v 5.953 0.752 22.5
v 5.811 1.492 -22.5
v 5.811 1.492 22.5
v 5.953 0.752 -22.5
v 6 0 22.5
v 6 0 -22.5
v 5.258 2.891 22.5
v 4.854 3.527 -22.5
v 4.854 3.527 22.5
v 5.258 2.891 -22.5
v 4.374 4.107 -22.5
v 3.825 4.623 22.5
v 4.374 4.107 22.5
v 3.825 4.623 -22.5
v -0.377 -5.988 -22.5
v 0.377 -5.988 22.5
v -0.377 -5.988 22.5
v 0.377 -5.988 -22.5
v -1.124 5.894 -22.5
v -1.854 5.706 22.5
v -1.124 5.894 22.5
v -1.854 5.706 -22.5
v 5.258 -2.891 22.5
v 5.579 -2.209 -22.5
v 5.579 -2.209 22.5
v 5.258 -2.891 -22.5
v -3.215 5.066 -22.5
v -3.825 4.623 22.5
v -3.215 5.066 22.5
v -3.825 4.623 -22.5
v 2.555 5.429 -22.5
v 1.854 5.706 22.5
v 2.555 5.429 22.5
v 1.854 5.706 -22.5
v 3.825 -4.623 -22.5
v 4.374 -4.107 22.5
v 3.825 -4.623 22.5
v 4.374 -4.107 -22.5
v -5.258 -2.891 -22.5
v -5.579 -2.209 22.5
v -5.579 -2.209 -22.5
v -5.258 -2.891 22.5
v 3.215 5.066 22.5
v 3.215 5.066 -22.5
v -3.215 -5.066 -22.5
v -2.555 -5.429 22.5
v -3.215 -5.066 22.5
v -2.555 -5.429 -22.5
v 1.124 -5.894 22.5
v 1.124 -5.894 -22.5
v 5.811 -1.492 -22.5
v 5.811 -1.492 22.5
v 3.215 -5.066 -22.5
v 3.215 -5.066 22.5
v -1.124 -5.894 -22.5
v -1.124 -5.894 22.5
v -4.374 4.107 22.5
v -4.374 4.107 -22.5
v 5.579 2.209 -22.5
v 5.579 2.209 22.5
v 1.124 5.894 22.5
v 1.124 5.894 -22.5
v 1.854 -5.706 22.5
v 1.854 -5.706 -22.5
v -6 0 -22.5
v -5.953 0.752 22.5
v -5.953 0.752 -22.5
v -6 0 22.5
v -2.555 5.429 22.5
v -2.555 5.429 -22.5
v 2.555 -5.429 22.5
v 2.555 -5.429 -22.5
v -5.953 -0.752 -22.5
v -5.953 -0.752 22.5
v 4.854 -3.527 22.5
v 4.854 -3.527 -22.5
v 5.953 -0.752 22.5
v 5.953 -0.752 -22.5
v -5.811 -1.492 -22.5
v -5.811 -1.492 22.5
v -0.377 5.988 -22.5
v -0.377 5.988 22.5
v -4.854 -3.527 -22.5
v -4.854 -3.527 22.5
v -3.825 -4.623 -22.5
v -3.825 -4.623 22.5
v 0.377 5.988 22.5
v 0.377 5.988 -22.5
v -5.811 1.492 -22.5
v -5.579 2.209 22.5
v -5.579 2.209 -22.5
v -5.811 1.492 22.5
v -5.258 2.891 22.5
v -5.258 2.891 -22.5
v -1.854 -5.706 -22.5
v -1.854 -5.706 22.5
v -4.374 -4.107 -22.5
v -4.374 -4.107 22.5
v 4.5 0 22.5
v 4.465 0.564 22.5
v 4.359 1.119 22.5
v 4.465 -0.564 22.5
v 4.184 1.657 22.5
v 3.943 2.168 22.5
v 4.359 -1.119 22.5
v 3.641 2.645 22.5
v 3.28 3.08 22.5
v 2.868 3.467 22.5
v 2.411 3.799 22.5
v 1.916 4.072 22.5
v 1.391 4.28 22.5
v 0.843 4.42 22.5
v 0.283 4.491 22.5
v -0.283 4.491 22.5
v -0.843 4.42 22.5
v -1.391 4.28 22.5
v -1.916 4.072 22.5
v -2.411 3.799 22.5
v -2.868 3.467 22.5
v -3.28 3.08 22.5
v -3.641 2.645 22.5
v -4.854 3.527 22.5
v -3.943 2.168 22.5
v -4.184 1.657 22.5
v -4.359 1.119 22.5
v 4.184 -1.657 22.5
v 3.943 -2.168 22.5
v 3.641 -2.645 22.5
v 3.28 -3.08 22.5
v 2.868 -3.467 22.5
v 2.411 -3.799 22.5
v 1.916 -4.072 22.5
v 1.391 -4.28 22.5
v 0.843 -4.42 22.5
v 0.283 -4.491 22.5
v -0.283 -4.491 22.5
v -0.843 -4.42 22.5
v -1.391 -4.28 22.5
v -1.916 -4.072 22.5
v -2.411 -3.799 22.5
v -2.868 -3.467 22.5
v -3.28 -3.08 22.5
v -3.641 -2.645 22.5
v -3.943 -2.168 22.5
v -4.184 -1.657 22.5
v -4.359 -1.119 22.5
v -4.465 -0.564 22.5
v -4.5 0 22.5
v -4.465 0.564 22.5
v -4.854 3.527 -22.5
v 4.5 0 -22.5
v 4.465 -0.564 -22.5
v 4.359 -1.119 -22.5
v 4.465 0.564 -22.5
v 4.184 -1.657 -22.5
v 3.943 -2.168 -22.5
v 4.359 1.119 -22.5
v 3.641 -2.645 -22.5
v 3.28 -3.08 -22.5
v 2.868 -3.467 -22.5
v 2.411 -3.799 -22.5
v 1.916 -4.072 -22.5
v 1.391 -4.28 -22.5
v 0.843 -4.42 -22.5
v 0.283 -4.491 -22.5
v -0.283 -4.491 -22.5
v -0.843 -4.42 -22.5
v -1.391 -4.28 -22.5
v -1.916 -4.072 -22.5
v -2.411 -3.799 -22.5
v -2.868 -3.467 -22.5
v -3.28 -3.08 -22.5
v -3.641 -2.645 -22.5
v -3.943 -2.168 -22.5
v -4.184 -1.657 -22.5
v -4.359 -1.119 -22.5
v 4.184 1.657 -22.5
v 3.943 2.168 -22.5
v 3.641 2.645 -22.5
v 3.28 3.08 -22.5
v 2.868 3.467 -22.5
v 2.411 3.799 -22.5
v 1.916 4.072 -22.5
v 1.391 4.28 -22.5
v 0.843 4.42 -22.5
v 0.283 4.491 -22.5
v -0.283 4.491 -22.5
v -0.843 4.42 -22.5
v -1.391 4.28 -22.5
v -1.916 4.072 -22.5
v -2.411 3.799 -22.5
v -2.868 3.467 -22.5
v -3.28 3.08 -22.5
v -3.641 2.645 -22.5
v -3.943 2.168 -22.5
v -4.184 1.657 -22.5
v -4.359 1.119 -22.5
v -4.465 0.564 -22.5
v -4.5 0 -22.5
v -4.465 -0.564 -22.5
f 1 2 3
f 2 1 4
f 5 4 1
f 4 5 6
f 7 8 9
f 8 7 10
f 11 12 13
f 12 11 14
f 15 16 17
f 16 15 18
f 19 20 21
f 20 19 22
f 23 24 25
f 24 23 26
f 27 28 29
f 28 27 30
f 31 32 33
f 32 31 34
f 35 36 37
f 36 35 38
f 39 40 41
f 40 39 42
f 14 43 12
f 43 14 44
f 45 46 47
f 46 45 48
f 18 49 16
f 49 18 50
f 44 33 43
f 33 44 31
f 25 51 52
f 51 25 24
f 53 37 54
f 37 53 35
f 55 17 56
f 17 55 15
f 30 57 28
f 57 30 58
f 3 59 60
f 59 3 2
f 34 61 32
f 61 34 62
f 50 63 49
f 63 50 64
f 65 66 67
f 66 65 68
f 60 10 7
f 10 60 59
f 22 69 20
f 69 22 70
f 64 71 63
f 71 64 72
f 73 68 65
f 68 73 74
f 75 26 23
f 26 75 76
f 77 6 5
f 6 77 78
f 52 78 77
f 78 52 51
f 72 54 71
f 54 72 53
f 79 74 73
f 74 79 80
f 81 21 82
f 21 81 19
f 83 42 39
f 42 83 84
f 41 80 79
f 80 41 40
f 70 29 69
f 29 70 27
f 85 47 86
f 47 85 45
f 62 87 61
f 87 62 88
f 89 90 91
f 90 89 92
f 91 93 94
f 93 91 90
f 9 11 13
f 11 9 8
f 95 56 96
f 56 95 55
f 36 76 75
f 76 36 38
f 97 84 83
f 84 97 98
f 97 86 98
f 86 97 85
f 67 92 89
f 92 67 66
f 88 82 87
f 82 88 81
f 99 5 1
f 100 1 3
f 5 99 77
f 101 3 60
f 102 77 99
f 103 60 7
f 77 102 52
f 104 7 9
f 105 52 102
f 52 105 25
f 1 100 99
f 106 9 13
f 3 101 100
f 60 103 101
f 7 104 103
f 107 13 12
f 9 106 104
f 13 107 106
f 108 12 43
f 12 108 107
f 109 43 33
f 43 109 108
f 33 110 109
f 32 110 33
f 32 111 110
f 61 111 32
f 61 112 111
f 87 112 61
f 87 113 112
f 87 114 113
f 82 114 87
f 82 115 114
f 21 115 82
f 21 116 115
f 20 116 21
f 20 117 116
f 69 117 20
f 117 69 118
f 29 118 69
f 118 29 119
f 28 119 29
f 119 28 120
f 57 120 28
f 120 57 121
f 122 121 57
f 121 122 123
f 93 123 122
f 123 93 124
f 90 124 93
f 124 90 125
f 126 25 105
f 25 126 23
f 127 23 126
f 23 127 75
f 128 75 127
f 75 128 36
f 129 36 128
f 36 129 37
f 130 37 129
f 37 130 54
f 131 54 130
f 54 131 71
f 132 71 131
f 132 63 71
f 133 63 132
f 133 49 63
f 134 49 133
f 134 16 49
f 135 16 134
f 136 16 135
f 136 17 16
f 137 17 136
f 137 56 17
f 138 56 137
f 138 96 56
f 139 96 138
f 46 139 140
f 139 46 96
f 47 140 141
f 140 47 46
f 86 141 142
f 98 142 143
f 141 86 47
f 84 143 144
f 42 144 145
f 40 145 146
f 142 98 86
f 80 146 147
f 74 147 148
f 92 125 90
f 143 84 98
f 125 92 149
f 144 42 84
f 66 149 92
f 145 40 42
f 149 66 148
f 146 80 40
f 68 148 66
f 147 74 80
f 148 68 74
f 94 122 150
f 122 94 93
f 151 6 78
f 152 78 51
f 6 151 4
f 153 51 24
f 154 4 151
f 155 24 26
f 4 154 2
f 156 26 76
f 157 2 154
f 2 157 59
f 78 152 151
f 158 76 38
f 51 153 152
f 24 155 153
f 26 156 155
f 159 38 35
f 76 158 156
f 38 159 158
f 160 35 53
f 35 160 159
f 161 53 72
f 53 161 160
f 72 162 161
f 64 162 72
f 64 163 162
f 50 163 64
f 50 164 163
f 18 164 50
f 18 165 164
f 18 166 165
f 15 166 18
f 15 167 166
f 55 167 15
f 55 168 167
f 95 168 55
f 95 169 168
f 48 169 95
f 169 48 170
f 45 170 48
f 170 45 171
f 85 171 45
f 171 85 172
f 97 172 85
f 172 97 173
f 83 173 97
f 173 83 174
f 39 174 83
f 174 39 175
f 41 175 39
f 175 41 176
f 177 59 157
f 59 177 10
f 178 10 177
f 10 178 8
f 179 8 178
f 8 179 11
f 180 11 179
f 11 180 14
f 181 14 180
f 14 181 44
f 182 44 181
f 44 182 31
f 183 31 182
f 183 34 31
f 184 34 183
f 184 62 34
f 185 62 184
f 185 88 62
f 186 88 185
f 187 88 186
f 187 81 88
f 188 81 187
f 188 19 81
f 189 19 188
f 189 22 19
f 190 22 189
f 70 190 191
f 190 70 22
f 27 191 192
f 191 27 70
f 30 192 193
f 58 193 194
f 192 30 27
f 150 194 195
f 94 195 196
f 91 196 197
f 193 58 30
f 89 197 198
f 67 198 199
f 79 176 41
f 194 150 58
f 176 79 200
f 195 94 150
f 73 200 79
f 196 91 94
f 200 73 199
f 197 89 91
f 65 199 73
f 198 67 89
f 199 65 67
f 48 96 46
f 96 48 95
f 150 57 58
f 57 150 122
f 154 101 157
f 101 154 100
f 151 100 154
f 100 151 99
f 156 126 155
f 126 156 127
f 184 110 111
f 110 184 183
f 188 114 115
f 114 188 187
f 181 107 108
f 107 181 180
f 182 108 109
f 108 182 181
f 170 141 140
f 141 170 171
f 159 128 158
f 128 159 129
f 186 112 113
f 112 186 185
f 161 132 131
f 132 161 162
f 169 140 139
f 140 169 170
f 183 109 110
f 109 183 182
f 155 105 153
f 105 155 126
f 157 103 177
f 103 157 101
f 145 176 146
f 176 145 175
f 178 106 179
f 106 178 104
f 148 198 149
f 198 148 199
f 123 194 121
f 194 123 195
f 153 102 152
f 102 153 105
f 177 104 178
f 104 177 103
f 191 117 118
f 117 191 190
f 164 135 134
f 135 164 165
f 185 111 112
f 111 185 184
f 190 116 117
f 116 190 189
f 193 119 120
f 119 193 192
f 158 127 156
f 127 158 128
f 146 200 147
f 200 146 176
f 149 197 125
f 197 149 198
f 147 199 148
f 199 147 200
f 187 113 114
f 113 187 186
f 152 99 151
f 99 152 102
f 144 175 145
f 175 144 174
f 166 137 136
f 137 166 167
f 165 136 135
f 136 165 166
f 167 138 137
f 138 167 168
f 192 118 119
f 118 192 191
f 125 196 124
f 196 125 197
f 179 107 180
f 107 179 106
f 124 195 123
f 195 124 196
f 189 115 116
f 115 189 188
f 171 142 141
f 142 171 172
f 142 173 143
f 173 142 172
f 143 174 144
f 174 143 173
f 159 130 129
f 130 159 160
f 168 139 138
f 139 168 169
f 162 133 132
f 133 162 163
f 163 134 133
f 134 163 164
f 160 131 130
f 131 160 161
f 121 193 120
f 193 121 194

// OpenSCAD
$fn = 50;


difference() {
	union() {
		translate(v = [0, 0, -22.5000000000]) {
			cylinder(h = 45, r = 6.0000000000);
		}
	}
	union() {
		translate(v = [0, 0, -100.0000000000]) {
			cylinder(h = 200, r = 4.5000000000);
		}
	}
}
